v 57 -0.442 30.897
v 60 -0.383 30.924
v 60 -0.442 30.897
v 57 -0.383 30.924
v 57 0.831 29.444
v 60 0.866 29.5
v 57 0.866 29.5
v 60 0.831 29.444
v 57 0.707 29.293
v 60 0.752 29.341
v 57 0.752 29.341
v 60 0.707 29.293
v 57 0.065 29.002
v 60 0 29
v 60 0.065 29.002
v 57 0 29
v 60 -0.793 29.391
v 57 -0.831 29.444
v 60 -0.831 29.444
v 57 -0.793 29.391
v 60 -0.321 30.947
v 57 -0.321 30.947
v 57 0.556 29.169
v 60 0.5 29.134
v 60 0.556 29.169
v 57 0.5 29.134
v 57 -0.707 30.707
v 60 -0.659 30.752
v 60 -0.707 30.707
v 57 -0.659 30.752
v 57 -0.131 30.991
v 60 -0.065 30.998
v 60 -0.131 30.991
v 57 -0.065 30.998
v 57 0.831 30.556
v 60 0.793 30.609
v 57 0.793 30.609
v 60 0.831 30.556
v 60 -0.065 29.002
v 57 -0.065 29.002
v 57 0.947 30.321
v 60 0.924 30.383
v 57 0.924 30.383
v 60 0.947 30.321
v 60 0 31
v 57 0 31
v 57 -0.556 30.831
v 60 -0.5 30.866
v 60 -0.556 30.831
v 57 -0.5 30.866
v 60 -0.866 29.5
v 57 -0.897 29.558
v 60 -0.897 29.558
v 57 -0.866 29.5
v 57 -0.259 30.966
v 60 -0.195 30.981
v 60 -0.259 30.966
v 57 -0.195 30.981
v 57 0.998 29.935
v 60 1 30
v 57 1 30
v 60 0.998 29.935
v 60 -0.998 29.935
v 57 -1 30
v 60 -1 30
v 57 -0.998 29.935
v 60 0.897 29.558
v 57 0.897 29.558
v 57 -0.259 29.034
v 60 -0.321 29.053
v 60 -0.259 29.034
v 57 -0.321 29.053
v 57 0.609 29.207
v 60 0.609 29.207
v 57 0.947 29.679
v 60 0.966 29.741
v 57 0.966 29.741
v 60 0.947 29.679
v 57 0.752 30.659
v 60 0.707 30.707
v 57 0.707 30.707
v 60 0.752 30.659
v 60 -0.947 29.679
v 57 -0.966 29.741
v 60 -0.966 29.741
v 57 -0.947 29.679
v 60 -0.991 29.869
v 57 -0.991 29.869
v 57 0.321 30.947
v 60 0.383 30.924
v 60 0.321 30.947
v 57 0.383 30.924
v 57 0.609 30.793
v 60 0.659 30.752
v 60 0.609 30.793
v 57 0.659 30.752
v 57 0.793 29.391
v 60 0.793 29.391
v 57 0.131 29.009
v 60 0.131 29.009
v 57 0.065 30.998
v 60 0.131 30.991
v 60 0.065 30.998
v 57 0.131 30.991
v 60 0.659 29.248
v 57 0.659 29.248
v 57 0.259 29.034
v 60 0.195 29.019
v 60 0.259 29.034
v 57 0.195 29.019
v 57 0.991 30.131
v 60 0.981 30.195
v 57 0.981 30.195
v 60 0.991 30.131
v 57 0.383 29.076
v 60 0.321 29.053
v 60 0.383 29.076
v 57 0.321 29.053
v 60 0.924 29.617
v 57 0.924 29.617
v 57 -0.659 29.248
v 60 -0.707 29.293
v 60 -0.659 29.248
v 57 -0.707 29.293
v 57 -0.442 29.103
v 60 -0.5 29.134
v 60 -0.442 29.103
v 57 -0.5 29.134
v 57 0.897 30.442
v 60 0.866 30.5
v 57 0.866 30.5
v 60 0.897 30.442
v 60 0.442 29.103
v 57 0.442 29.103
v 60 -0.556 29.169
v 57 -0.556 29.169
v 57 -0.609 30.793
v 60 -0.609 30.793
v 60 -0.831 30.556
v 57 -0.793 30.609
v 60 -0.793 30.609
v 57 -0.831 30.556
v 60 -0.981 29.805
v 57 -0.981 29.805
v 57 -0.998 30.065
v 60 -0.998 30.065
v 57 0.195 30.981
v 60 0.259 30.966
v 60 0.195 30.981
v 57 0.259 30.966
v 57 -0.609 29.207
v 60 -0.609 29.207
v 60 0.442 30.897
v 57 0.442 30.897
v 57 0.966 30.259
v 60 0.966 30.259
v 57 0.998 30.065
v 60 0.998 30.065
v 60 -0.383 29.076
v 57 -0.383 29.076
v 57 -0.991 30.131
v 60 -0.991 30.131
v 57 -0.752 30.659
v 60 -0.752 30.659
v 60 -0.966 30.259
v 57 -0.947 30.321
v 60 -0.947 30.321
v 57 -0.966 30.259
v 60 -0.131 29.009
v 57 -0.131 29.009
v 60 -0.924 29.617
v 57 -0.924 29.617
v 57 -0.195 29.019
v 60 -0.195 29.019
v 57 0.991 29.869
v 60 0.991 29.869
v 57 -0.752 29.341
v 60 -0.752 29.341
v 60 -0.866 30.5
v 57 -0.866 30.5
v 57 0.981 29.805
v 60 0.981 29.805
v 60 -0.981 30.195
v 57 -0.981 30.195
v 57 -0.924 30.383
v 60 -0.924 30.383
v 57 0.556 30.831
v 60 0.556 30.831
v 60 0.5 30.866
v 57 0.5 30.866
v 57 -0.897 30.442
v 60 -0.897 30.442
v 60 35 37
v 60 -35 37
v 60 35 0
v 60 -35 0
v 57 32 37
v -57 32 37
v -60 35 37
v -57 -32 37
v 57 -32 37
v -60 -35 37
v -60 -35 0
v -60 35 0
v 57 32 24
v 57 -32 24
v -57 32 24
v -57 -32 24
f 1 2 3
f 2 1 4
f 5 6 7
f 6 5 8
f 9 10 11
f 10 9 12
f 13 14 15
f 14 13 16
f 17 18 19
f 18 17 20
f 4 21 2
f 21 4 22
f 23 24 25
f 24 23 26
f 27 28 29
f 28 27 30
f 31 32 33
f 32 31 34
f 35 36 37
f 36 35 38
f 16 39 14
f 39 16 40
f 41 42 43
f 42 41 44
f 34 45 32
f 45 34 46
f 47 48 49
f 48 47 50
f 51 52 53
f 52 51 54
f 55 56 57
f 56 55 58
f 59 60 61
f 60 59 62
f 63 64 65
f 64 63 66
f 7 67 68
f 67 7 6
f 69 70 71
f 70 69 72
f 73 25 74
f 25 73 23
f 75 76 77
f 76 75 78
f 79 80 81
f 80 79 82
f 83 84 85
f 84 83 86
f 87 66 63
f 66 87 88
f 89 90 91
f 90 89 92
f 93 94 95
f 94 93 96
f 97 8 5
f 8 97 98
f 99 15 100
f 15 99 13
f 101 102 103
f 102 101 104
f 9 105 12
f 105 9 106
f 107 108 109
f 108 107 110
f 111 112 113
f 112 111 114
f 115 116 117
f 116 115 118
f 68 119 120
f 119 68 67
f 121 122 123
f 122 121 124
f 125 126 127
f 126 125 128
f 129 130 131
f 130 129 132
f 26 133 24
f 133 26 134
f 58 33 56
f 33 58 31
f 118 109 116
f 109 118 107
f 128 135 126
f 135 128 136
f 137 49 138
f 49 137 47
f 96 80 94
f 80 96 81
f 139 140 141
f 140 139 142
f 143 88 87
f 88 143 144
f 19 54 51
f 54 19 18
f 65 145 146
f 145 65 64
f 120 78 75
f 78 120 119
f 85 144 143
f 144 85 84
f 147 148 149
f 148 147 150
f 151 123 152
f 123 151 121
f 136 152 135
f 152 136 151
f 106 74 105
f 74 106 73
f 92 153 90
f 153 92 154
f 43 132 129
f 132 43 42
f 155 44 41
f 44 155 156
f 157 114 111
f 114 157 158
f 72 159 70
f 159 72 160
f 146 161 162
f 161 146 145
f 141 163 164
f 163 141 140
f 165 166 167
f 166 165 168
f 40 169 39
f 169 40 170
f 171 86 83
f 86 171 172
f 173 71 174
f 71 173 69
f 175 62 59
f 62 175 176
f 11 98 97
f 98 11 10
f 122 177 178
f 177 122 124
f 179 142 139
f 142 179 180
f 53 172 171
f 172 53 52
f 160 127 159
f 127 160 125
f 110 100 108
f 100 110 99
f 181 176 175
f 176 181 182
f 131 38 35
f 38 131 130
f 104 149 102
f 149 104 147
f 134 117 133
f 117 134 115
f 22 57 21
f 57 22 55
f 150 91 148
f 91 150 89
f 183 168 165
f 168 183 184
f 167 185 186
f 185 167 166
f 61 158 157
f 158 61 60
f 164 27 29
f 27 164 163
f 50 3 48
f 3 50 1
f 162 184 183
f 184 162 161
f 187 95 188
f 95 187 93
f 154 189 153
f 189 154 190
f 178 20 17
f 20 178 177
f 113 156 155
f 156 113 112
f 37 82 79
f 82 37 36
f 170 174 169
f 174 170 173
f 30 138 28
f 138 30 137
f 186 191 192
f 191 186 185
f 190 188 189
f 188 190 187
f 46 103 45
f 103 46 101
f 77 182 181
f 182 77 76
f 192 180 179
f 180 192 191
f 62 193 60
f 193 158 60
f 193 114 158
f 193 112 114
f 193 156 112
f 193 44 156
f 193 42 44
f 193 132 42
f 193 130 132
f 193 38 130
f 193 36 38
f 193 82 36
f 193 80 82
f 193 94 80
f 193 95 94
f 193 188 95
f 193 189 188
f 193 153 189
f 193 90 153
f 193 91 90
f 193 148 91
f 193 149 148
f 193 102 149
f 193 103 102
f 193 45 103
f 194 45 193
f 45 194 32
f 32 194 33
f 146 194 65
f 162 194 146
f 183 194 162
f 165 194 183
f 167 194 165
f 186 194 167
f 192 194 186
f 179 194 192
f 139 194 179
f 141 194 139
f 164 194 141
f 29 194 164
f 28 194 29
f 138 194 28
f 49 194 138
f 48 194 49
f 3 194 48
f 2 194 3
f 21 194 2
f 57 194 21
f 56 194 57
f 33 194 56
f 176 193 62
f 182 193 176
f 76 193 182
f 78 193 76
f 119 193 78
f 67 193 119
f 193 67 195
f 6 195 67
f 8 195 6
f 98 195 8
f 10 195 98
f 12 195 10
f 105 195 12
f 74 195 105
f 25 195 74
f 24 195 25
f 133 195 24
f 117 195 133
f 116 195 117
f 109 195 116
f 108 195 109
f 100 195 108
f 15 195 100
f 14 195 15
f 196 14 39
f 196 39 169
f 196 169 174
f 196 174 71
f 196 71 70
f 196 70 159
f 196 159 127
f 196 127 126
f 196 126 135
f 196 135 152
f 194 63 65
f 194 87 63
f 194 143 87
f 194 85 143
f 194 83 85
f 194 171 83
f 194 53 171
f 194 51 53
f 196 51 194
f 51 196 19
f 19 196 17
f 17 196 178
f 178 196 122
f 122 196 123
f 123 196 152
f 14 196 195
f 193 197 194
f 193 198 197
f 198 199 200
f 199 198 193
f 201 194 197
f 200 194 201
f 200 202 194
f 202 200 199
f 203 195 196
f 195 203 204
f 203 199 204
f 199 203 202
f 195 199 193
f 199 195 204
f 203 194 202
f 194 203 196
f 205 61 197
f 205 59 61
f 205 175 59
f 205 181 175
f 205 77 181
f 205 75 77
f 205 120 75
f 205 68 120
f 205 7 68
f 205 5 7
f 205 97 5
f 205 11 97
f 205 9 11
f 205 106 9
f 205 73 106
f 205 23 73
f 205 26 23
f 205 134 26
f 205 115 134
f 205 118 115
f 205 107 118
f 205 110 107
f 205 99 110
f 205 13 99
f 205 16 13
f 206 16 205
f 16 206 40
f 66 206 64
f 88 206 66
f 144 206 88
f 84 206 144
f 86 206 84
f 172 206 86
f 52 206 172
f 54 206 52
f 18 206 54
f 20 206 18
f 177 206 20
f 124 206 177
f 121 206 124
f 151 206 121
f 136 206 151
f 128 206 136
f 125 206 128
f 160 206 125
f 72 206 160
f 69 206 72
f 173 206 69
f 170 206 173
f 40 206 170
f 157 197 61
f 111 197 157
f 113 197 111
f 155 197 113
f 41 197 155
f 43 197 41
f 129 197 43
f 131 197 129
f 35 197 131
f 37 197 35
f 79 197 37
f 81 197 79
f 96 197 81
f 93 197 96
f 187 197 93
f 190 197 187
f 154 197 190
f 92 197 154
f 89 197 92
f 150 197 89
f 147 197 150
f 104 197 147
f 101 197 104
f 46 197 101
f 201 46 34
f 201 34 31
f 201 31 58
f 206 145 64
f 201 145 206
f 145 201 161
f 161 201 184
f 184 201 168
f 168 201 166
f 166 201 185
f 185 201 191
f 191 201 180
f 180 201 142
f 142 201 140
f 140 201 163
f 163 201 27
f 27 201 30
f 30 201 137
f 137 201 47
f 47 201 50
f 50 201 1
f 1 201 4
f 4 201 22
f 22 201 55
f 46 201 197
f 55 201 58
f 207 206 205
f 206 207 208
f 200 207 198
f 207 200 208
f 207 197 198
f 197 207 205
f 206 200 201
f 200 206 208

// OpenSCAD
// Mini horizontal gel-electrophoresis buffer tank
// Print orientation: open top facing up (+Z), resting on XY plane at z = 0

// ---------------- Parameters ----------------
tank_x      = 120;   // outer length in X (mm)
tank_y      = 70;    // outer width in Y (mm)
tank_z      = 40;    // outer height in Z (mm)
wall        = 3;     // wall thickness (mm)
floor       = 3;     // floor thickness (mm)

platform_x  = 60;    // platform length in X (mm), centred
platform_z  = 13;    // platform top height above inner floor (mm) -> z = 16

hole_d      = 2;     // electrode wire hole diameter (mm)
hole_y      = 0;     // hole centre Y (mm)
hole_z      = 30;    // hole centre Z (mm)

eps         = 0.5;   // cutter overshoot past faces (mm)
$fn         = 96;    // curve resolution

// ---------------- Derived ----------------
inner_x = tank_x - 2 * wall;   // 114
inner_y = tank_y - 2 * wall;   // 64
inner_z = tank_z - floor;      // 37

// ---------------- Model ----------------
difference() {
    // Tank body (solid floor, open top)
    translate([-tank_x / 2, -tank_y / 2, 0])
        cube([tank_x, tank_y, tank_z - floor]);

    // Raised gel-tray platform, full inner width, centred in X
    translate([-inner_x / 2, -inner_y / 2, inner_z - platform_z])
        cube([inner_x, inner_y, platform_z]);

    // Horizontal electrode holes through each end wall along X
    for (sx = [-1, 1])
        translate([sx * (inner_x / 2 - eps), hole_y, hole_z])
            rotate([0, 90, 0])
                cylinder(d = hole_d, h = inner_x + 2 * eps);
}
